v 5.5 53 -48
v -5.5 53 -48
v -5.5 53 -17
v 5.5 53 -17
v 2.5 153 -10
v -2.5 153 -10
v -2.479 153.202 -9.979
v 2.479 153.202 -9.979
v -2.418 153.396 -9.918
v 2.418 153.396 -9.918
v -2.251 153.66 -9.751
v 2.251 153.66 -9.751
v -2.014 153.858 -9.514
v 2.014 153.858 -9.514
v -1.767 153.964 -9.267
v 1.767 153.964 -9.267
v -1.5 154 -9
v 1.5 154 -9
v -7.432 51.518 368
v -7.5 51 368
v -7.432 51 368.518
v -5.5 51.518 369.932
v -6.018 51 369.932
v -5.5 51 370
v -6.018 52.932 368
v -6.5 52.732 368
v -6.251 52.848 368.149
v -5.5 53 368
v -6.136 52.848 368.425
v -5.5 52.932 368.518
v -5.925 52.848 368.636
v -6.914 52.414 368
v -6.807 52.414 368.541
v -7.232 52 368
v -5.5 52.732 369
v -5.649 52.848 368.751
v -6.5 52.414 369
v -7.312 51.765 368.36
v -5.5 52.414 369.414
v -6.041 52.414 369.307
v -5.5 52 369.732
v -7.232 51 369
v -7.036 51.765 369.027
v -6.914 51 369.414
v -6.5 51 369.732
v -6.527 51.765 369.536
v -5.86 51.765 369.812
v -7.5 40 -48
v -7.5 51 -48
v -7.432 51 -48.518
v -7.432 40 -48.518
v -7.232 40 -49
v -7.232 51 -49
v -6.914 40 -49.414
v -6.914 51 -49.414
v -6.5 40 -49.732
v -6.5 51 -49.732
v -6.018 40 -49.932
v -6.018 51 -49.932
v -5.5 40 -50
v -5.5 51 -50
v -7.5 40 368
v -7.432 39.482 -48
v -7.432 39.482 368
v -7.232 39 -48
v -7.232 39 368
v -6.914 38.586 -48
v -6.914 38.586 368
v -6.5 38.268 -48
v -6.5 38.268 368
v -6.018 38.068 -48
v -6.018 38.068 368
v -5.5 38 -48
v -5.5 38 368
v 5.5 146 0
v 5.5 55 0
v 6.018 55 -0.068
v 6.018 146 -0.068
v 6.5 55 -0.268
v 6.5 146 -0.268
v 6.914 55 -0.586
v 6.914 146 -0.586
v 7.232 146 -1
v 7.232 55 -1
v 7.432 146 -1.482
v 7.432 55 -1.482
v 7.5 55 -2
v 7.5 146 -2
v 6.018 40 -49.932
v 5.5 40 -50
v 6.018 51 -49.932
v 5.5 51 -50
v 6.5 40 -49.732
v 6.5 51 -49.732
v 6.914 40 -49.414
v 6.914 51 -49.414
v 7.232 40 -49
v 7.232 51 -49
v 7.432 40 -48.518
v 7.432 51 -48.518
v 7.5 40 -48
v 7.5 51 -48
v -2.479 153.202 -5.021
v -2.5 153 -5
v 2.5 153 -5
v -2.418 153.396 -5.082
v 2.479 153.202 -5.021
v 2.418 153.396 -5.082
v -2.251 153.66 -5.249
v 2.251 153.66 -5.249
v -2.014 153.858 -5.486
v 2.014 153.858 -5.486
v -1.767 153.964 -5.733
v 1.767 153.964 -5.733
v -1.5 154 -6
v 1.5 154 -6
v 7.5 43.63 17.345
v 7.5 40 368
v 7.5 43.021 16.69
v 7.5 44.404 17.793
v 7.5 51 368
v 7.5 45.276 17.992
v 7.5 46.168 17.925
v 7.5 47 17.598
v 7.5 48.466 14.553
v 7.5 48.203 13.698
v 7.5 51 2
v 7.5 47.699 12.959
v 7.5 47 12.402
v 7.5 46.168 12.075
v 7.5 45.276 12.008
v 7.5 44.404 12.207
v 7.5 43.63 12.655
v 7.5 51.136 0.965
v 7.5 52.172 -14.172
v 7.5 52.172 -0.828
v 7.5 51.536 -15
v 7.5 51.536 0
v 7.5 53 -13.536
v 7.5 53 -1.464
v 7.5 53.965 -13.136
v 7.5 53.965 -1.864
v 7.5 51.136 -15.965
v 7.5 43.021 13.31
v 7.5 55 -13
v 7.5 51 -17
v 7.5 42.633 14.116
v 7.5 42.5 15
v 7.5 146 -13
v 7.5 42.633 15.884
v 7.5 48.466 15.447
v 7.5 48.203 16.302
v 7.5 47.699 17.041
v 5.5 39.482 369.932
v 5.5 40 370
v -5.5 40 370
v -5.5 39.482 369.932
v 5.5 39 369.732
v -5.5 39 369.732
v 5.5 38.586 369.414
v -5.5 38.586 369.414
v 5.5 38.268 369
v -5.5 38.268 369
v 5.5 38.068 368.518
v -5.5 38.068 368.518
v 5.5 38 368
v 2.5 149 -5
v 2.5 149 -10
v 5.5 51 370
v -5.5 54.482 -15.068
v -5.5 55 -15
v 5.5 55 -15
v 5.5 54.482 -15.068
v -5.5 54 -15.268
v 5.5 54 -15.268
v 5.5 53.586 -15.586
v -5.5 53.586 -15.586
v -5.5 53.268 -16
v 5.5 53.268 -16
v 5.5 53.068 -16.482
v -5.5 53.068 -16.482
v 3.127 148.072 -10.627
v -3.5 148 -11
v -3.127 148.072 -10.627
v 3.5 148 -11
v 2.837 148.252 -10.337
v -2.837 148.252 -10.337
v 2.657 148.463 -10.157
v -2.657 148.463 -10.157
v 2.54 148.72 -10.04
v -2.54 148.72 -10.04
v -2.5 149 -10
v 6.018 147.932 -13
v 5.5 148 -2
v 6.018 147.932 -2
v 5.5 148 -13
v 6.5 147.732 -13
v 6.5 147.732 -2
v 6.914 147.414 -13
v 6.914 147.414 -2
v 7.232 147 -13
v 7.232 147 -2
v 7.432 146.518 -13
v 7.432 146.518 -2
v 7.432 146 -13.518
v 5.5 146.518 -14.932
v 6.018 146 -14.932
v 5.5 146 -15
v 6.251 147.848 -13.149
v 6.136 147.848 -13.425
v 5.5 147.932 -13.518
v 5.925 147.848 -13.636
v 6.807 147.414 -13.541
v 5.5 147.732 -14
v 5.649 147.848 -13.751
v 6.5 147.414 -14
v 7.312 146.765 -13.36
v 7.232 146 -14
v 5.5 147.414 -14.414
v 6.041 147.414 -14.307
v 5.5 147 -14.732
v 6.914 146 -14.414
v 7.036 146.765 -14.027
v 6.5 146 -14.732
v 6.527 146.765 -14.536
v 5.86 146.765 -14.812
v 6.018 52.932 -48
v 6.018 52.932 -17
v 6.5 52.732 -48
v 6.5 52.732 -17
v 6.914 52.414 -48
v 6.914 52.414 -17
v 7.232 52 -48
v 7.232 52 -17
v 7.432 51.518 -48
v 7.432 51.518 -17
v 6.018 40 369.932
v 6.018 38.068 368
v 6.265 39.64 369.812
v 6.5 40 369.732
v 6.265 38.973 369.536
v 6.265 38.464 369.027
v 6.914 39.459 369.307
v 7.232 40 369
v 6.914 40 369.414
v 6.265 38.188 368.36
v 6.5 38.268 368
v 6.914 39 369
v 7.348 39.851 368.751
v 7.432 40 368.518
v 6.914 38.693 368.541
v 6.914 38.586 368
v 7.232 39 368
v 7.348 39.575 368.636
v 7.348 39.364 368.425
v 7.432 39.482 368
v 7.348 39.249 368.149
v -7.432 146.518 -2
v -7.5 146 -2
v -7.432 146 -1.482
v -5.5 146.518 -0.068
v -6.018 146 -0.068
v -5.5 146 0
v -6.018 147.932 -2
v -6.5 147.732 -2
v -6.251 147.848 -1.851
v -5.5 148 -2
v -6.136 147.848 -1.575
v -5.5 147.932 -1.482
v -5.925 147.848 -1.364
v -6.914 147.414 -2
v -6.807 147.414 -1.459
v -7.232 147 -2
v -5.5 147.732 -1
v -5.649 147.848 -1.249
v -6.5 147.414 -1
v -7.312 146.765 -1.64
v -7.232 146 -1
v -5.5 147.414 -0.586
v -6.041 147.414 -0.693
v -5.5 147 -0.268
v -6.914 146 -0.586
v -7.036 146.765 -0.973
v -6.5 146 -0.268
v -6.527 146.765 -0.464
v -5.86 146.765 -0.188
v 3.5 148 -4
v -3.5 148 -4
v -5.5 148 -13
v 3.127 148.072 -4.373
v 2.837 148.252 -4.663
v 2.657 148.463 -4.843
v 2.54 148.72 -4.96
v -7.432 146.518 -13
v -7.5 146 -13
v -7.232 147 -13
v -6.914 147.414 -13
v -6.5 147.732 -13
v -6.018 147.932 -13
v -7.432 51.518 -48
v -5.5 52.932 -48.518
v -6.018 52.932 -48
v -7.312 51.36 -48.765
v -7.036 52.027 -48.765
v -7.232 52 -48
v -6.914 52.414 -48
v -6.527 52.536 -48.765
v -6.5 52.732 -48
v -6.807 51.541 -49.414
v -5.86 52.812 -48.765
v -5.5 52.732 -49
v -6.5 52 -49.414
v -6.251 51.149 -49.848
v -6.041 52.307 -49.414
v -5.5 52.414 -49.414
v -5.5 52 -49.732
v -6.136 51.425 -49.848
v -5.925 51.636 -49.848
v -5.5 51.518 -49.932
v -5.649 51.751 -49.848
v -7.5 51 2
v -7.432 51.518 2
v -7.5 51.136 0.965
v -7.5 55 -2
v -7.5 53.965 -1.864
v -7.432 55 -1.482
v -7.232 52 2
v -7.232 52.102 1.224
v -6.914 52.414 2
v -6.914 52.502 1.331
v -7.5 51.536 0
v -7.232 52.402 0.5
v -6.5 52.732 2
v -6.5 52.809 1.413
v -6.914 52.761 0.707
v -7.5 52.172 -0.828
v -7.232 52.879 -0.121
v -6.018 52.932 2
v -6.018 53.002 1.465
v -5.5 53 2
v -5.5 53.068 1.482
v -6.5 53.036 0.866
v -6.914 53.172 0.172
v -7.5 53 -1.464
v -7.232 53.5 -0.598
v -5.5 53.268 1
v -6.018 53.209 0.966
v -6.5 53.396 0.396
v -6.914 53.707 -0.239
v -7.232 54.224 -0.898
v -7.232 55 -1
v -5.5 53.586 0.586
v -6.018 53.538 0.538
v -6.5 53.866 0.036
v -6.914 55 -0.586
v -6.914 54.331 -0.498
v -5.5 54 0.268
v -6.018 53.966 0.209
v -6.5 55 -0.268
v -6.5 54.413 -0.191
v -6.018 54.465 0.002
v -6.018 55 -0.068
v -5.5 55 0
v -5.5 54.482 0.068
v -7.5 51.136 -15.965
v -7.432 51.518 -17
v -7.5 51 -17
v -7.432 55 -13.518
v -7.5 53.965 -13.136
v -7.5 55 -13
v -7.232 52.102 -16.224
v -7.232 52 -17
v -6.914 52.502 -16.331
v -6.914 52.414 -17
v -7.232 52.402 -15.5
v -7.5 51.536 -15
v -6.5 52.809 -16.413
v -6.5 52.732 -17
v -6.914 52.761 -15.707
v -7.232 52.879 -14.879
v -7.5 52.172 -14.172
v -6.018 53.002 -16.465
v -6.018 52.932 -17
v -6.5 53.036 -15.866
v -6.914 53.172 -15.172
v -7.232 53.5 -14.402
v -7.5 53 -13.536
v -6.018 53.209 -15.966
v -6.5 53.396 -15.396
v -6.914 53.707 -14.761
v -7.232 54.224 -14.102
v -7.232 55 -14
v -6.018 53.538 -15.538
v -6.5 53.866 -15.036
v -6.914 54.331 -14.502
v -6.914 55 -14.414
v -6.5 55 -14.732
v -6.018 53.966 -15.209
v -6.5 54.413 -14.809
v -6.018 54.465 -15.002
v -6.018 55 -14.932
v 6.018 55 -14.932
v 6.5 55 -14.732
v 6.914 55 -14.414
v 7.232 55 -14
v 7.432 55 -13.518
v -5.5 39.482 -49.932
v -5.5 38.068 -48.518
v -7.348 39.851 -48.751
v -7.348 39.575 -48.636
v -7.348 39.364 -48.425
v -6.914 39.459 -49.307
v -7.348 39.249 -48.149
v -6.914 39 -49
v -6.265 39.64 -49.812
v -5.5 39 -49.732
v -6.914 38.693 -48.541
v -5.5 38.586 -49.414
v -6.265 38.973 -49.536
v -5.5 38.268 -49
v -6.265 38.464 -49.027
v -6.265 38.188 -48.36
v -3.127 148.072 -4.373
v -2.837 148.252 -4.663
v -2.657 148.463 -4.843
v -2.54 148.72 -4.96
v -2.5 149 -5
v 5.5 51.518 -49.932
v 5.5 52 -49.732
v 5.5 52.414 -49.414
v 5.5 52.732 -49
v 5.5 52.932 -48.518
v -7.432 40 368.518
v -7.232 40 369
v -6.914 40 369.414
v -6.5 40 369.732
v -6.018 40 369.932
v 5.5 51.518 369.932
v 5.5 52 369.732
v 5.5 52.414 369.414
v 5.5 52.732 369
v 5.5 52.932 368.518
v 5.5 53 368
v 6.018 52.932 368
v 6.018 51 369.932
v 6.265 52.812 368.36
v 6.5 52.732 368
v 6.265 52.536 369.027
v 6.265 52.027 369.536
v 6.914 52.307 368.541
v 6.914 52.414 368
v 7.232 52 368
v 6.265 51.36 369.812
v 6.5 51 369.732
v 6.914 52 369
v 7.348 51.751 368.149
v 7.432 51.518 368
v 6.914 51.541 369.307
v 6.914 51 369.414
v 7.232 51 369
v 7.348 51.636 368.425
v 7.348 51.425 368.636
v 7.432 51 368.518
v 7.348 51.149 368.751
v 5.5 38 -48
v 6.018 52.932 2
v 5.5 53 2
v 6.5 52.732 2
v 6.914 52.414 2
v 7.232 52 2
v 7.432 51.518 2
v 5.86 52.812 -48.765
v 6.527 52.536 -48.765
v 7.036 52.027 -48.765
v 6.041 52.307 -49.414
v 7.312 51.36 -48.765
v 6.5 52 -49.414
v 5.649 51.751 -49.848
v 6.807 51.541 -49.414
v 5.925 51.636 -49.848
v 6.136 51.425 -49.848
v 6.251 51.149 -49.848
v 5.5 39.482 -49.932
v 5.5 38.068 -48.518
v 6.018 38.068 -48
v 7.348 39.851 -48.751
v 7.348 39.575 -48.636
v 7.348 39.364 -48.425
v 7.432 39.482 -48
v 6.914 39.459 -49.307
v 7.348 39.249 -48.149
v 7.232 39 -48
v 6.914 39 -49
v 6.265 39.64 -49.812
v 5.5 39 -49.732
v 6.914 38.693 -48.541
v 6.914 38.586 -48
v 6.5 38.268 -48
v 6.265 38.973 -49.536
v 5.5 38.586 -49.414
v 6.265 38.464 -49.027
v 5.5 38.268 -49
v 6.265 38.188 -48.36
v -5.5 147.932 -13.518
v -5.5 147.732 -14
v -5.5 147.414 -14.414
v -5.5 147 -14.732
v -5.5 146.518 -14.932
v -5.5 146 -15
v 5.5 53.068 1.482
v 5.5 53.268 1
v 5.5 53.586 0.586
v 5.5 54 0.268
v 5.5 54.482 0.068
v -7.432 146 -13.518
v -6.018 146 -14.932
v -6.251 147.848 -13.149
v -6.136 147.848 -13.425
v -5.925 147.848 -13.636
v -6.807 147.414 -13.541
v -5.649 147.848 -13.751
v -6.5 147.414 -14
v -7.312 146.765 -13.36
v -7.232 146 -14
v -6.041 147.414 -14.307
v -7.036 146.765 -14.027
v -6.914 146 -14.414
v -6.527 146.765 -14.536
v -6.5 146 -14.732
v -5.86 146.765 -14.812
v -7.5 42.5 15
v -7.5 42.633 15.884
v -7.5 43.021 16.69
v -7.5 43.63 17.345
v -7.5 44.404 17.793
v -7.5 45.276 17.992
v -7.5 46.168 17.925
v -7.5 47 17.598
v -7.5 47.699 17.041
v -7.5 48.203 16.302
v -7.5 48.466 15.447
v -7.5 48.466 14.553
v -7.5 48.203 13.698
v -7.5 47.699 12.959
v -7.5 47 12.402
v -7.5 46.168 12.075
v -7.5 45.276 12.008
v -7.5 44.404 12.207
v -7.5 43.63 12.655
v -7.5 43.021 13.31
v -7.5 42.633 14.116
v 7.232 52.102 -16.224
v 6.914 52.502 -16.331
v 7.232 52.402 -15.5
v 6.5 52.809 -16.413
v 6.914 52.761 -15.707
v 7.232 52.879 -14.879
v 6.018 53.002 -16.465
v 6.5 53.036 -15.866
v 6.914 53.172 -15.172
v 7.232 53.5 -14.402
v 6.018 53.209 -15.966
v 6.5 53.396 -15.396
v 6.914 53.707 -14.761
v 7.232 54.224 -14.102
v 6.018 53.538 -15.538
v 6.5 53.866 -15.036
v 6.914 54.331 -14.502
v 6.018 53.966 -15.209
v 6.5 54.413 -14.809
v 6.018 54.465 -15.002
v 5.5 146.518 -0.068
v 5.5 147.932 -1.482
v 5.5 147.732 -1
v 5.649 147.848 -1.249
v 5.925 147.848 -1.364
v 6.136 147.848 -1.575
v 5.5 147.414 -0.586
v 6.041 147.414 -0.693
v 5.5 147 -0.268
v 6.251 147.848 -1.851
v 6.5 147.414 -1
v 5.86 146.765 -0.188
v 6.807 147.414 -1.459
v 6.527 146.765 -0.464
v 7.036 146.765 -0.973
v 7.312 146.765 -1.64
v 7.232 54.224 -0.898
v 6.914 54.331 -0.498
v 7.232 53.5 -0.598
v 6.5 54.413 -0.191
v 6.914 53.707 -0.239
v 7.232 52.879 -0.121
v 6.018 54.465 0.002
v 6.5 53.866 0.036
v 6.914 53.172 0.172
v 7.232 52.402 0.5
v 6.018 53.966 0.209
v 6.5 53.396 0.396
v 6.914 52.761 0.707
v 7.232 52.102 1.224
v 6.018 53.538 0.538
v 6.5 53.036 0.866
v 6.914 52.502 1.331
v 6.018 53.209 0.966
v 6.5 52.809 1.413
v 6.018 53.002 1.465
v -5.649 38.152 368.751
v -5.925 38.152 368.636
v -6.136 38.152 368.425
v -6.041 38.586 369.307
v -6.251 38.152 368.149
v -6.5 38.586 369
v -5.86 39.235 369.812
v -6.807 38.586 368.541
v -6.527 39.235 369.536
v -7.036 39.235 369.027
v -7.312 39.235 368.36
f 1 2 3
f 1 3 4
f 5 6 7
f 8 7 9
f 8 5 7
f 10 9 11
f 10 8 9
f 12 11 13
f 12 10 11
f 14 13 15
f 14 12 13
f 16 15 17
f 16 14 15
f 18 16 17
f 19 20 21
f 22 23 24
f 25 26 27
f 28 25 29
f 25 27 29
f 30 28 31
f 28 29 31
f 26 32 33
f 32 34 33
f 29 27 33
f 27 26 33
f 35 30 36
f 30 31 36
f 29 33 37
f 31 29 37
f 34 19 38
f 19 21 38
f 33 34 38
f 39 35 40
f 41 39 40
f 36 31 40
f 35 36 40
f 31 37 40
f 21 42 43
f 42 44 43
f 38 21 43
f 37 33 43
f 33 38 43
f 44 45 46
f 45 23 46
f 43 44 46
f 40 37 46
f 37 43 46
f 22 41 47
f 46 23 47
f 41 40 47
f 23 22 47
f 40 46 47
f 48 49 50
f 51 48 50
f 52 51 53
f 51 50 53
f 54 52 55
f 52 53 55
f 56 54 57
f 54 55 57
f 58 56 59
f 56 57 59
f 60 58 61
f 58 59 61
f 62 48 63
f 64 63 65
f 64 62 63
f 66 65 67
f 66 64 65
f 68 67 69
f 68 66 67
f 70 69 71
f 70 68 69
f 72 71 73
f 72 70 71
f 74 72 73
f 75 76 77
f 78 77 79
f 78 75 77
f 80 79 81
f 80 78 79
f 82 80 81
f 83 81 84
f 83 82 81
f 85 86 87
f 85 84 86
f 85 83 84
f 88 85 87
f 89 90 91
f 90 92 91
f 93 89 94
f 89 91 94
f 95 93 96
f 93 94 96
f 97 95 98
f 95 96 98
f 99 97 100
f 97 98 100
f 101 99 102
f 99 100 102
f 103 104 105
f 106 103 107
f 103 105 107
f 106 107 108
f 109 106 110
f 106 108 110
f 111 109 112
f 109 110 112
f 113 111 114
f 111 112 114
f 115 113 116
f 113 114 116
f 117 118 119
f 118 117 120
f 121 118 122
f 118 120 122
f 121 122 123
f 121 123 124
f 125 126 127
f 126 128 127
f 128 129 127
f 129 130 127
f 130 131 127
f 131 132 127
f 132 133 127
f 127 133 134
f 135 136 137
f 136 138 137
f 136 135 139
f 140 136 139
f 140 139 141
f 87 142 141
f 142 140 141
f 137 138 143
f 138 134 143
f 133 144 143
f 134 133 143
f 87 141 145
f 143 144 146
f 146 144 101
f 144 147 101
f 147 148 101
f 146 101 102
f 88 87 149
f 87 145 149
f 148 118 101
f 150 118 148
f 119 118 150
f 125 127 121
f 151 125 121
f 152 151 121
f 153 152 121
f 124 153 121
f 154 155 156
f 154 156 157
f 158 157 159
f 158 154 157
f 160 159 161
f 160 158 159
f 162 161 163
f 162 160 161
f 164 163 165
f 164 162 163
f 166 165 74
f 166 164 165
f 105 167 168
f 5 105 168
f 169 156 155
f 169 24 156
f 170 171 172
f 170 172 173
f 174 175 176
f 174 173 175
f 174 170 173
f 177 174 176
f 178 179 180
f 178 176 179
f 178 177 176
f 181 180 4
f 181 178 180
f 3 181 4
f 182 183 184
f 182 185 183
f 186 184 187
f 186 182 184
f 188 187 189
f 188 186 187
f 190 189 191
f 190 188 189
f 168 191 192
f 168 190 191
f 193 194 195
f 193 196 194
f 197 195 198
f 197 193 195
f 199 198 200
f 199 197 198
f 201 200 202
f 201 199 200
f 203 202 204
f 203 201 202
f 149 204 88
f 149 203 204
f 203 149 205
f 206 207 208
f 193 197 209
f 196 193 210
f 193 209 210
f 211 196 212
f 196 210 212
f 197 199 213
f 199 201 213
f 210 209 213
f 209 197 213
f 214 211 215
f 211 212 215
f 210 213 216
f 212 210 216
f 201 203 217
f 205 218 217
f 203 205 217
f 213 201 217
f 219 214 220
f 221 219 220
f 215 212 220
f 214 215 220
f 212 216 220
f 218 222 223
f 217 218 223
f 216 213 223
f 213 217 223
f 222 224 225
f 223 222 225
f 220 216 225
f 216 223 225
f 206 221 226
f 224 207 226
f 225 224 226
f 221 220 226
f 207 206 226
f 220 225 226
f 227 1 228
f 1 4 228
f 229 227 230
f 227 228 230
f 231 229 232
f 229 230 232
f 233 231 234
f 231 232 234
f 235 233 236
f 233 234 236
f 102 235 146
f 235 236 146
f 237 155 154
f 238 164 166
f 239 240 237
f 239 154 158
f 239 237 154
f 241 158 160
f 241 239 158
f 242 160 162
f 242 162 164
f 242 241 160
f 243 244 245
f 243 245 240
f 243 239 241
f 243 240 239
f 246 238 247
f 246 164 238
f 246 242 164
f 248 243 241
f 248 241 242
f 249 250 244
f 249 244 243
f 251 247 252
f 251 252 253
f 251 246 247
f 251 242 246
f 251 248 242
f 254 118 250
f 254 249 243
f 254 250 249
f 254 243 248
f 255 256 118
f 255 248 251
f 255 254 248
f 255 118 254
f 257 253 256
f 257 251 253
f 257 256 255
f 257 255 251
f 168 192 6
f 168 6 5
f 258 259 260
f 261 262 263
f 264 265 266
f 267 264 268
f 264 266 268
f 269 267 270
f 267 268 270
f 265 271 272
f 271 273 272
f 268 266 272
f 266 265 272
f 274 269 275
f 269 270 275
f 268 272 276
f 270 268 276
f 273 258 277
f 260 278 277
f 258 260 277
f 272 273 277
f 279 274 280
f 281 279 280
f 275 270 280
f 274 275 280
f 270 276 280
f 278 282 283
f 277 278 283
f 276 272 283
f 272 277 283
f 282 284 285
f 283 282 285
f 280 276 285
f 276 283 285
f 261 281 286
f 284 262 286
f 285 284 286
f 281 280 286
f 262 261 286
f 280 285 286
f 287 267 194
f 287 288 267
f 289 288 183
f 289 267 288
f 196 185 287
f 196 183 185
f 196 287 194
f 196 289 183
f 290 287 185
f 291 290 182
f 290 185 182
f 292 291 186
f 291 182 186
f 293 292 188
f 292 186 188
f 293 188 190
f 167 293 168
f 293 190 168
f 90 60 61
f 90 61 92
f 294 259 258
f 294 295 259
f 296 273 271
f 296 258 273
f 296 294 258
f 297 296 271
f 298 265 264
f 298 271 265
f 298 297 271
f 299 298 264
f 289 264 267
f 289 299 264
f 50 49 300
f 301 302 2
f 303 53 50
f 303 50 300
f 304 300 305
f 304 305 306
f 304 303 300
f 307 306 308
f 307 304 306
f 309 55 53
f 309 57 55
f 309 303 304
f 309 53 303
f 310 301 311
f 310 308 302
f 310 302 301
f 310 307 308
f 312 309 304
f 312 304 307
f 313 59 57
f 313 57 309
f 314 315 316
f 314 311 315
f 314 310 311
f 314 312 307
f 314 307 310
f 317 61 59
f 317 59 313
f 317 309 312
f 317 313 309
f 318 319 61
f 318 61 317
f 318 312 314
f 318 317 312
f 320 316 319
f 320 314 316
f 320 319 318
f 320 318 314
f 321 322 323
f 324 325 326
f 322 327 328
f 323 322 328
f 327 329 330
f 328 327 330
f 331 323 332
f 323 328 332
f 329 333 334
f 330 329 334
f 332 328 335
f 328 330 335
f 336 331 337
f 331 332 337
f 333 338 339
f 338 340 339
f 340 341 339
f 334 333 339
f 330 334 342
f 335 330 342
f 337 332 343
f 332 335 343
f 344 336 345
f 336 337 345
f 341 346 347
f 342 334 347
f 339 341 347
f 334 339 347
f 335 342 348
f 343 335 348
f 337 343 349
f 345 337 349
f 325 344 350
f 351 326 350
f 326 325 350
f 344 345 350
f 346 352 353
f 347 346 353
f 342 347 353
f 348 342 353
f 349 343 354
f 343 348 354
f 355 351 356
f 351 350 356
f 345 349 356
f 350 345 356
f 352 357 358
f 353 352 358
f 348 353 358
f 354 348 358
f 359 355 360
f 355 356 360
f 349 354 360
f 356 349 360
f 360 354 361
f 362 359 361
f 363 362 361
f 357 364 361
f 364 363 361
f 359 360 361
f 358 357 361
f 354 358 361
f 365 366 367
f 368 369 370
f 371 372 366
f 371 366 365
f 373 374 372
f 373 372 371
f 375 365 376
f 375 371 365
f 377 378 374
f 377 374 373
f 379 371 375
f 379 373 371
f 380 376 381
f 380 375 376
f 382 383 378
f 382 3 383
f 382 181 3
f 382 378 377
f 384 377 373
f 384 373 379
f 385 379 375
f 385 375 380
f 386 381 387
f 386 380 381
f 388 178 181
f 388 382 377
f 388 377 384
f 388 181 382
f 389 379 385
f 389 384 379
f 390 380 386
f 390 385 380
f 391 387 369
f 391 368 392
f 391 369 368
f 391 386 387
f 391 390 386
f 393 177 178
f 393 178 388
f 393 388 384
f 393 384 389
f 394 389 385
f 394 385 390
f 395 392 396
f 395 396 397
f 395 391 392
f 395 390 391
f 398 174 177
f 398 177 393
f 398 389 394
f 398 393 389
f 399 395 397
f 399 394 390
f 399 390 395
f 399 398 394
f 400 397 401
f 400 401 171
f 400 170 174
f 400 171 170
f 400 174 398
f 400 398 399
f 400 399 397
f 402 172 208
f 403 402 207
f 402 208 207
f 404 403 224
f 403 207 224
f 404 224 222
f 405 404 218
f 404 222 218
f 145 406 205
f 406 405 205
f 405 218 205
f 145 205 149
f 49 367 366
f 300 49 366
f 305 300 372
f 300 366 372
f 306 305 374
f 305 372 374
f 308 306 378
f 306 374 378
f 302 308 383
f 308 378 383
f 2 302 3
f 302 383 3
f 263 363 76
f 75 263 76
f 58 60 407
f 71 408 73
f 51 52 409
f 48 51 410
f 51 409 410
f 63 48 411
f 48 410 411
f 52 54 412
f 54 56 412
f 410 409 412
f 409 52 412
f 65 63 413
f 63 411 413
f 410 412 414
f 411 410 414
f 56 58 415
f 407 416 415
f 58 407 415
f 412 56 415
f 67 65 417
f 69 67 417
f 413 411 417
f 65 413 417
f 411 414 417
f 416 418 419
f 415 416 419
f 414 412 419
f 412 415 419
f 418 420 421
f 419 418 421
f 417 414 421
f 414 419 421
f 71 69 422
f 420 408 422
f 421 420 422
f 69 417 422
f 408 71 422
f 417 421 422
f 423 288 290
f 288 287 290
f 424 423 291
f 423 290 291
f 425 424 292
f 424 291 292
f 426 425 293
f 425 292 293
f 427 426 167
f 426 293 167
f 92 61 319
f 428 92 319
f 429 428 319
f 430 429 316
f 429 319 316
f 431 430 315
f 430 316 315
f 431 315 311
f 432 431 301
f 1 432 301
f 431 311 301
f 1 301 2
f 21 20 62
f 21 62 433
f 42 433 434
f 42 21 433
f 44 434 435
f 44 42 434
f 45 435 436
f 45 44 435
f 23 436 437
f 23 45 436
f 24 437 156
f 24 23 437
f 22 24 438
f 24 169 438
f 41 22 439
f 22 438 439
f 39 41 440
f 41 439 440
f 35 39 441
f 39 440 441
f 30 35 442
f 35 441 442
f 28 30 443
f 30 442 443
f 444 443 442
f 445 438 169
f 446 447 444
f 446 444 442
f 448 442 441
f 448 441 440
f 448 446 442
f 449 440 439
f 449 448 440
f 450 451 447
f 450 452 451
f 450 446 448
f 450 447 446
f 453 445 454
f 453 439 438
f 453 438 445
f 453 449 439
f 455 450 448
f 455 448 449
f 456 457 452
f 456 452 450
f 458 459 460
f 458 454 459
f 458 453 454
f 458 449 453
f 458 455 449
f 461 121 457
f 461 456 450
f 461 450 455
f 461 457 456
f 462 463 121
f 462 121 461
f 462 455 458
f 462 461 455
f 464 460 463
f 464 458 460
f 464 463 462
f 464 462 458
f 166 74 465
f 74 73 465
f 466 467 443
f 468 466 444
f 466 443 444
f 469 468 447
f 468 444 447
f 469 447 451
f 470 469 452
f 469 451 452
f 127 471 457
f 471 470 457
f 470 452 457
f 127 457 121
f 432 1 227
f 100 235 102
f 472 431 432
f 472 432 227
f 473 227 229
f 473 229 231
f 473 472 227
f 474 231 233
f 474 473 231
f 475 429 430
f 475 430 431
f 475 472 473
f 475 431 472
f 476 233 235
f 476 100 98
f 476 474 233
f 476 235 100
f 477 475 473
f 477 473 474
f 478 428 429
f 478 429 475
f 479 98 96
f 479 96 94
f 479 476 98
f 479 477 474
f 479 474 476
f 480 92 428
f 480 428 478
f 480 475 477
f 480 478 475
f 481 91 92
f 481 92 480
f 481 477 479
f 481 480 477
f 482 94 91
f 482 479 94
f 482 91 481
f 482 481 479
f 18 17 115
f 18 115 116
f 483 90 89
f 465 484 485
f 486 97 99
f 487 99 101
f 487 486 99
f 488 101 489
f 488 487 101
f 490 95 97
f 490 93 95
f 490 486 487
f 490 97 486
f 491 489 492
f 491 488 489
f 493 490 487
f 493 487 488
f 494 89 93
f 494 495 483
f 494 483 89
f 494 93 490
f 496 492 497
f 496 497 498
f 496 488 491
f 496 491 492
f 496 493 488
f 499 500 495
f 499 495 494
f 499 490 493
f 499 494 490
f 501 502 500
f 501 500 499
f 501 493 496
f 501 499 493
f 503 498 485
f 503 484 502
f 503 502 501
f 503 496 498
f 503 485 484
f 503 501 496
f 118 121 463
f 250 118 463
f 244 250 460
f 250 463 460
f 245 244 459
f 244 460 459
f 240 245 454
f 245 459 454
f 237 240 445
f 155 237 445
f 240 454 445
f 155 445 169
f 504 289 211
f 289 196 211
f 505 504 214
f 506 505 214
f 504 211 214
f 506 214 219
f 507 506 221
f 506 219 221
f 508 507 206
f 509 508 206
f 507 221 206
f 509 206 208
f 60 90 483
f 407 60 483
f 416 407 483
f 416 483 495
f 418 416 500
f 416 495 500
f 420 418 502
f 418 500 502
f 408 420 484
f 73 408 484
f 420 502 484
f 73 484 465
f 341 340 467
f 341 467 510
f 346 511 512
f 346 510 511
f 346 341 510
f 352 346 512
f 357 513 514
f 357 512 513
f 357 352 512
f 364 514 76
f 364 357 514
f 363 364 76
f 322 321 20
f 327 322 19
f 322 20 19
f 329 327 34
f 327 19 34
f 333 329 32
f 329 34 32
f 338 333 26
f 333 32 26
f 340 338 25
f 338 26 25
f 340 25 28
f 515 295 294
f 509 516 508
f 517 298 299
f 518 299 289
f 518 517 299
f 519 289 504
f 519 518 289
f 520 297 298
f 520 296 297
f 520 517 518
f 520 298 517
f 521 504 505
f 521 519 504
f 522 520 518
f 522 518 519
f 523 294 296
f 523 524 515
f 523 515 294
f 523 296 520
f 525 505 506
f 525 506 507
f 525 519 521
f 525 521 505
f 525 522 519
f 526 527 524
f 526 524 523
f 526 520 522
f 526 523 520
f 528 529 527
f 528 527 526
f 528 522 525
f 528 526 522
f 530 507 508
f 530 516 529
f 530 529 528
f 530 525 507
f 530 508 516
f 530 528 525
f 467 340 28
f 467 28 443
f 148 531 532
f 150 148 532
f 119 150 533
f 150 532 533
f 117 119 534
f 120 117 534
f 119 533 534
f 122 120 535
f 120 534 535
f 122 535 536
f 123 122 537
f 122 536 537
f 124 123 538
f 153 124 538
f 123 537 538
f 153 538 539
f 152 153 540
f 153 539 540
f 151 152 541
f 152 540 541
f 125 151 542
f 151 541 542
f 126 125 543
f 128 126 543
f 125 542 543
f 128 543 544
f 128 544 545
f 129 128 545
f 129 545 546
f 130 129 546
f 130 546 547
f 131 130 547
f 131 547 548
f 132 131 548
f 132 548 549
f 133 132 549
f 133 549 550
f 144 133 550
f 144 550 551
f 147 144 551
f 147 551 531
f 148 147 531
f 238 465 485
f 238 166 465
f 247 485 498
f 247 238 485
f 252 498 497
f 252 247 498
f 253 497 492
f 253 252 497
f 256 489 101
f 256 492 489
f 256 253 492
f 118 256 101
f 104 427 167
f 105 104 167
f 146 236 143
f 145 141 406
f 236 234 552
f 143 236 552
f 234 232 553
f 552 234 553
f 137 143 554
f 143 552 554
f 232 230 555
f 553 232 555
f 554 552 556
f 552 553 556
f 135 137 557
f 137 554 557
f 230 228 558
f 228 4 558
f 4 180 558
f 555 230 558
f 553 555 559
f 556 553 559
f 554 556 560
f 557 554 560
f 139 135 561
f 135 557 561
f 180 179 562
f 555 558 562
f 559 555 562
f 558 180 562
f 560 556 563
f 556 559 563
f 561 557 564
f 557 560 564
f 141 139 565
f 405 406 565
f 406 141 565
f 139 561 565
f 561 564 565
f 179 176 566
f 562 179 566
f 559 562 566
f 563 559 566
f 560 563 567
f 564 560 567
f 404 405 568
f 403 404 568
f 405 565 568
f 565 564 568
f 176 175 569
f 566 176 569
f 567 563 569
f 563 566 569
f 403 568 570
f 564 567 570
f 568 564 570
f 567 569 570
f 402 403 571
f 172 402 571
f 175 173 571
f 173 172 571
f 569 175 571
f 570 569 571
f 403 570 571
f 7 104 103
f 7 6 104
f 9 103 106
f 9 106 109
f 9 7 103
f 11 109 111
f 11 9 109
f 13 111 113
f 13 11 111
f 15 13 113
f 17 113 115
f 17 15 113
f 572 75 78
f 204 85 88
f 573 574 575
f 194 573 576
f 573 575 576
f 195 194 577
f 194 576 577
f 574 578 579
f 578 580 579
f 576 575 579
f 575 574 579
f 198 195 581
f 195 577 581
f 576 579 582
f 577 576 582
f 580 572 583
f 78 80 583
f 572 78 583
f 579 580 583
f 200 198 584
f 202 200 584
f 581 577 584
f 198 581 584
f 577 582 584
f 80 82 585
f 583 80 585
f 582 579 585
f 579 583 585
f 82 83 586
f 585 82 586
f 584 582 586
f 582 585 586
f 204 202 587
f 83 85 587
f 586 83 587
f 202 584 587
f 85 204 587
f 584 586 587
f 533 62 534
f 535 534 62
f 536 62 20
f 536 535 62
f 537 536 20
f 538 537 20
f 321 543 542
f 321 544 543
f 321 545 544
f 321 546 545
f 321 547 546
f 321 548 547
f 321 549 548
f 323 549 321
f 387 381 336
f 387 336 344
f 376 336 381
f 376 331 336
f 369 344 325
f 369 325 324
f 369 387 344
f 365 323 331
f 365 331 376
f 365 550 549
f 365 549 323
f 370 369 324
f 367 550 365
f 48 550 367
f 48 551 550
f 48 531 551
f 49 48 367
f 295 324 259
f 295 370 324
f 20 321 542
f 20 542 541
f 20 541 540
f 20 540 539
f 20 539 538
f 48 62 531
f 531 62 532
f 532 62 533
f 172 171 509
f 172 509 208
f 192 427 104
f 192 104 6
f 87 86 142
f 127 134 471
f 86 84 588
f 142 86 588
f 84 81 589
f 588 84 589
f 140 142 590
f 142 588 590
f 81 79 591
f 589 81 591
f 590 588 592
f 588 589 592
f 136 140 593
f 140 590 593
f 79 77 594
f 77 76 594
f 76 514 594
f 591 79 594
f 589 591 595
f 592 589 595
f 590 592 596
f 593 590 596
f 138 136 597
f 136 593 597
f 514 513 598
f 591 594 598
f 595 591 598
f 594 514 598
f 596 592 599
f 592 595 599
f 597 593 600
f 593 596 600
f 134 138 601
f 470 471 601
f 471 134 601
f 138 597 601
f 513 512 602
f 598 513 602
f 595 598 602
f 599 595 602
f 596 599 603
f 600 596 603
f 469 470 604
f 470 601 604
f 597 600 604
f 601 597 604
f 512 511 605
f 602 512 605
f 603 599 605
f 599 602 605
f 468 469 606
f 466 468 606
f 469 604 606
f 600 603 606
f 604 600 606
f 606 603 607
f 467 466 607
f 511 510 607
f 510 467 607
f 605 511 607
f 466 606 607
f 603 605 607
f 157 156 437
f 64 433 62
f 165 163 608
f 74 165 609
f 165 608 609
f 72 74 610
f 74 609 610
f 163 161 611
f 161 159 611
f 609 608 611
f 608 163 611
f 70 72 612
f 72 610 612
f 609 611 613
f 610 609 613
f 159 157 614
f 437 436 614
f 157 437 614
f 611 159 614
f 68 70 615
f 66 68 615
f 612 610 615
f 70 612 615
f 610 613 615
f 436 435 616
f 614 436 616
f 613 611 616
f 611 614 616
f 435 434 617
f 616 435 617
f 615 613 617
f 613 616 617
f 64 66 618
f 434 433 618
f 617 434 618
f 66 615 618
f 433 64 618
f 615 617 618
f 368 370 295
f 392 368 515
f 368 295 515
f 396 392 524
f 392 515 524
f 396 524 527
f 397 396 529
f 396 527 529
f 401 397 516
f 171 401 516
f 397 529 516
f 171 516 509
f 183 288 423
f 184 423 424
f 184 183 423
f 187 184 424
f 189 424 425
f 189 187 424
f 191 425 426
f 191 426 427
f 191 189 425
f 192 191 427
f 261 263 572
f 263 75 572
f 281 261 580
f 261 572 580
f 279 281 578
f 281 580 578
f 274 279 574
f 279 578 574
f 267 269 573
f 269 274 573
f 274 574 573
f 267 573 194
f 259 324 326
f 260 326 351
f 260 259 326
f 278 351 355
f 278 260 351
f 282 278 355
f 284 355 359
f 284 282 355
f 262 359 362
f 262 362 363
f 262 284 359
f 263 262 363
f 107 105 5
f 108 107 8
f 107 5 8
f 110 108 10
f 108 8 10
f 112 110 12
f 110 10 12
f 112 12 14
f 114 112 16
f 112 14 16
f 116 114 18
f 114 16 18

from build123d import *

# Parameters (mm, degrees)
SKETCH13_W          = 15
SKETCH13_H          = 15
BOSS_EXTRUDE3_DEPTH = 420
BOSS_EXTRUDE4_START = -70
SKETCH12_W          = 15
SKETCH12_H          = 15
BOSS_EXTRUDE4_DEPTH = 110
SKETCH14_W          = 5
SKETCH14_H          = 5
BOSS_EXTRUDE5_DEPTH = 6
FILLET1_R           = 2
FILLET2_R           = 1
FILLET3_R           = 2
FILLET4_R           = 2
SKETCH15_R          = 3
CUT_EXTRUDE1_DEPTH  = 402.04987221


with BuildPart() as part:
    # Sketch13 → Boss-Extrude3 (new body)
    with BuildSketch(Plane.XY.offset(-50)):
        with Locations((0, 45.5)):
            Rectangle(SKETCH13_W, SKETCH13_H)
    extrude(amount=BOSS_EXTRUDE3_DEPTH)

    # Sketch12 → Boss-Extrude4 (add)
    with BuildSketch(Plane(origin=(0, 108, 0), x_dir=(1, 0, 0), z_dir=(0, 1, 0)).offset(BOSS_EXTRUDE4_START)):
        with Locations((0, 7.5)):
            Rectangle(SKETCH12_W, SKETCH12_H)
    extrude(amount=BOSS_EXTRUDE4_DEPTH)

    # Sketch14 → Boss-Extrude5 (add)
    with BuildSketch(Plane(origin=(0, 148, 0), x_dir=(1, 0, 0), z_dir=(0, 1, 0))):
        with Locations((0, 7.5)):
            Rectangle(SKETCH14_W, SKETCH14_H)
    extrude(amount=BOSS_EXTRUDE5_DEPTH)

    # Fillet1
    fillet1_edges = [part.edges().sort_by_distance(p)[0] for p in [
        (-7.5, 45.5, 370),
        (0, 38, 370),
        (-7.5, 53, -32.5),
        (7.5, 53, -32.5),
        (-7.5, 100.5, -15),
        (-7.5, 100.5, 0),
        (0, 53, 0),
        (7.5, 100.5, 0),
        (7.5, 100.5, -15),
        (0, 53, -15),
        (-7.5, 148, -7.5),
        (0, 148, 0),
        (7.5, 148, -7.5),
        (0, 148, -15),
        (0, 38, -50),
        (-7.5, 45.5, -50),
        (7.5, 45.5, -50),
        (7.5, 38, 160),
        (-7.5, 38, 160),
        (-7.5, 53, 185),
        (7.5, 53, 185),
        (0, 53, 370),
    ]]
    fillet(fillet1_edges, radius=FILLET1_R)

    # Fillet2
    fillet2_edges = [part.edges().sort_by_distance(p)[0] for p in [
        (2.5, 148, -7.5),
        (0, 148, -10),
        (-2.5, 148, -7.5),
        (0, 148, -5),
        (2.5, 154, -7.5),
        (0, 154, -10),
        (-2.5, 154, -7.5),
        (0, 154, -5),
    ]]
    fillet(fillet2_edges, radius=FILLET2_R)

    # Fillet3
    # the kernel refuses this fillet: 2 mm, written as the material it takes off along each edge
    with BuildSketch(Plane(origin=(5.5, 51, 368), x_dir=(0, 0, 1), z_dir=(1, 0, 0))) as fillet3_piece_1_section:
        Polygon((0, 0), (FILLET3_R, 0), (FILLET3_R, -FILLET3_R), (0, -FILLET3_R), align=None)
    fillet3_piece_1 = extrude(amount=FILLET3_R, mode=Mode.PRIVATE)
    fillet3_piece_1 = fillet3_piece_1 - Plane(origin=(5.5, 51, 368), x_dir=(0, -0.7071067811865475, -0.7071067811865475), z_dir=(1, 0, 0)) * Sphere(FILLET3_R, mode=Mode.PRIVATE)
    add(fillet3_piece_1, mode=Mode.SUBTRACT)
    with BuildSketch(Plane(origin=(5.5, 40, 368), x_dir=(0, 0, 1), z_dir=(1, 0, 0))) as fillet3_piece_2_section:
        Polygon((0, 0), (FILLET3_R, 0), (FILLET3_R, FILLET3_R), (0, FILLET3_R), align=None)
    fillet3_piece_2 = extrude(amount=FILLET3_R, mode=Mode.PRIVATE)
    fillet3_piece_2 = fillet3_piece_2 - Plane(origin=(5.5, 40, 368), x_dir=(0, 0.7071067811865475, -0.7071067811865475), z_dir=(1, 0, 0)) * Sphere(FILLET3_R, mode=Mode.PRIVATE)
    add(fillet3_piece_2, mode=Mode.SUBTRACT)
    with BuildSketch(Plane(origin=(7.5, 51, 370), x_dir=(0, 0, -1), z_dir=(0, -1, 0))) as fillet3_piece_3:
        with BuildLine():
            CenterArc((FILLET3_R, -FILLET3_R), FILLET3_R, 90, 90)
            Line((0, -FILLET3_R), (0, 0))
            Line((0, 0), (FILLET3_R, 0))
        make_face()
    extrude(amount=11, mode=Mode.SUBTRACT)

    # Fillet4
    # the kernel refuses this fillet: 2 mm, written as the material it takes off along each edge
    with BuildSketch(Plane(origin=(-5.5, 51, -48), x_dir=(0, 1, 0), z_dir=(0, 0, -1))) as fillet4_piece_1_section:
        Polygon((0, 0), (FILLET4_R, 0), (FILLET4_R, -FILLET4_R), (0, -FILLET4_R), align=None)
    fillet4_piece_1 = extrude(amount=FILLET4_R, mode=Mode.PRIVATE)
    fillet4_piece_1 = fillet4_piece_1 - Plane(origin=(-5.5, 51, -48), x_dir=(0.7071067811865472, -0.7071067811865478, 0), z_dir=(0, 0, -1)) * Sphere(FILLET4_R, mode=Mode.PRIVATE)
    add(fillet4_piece_1, mode=Mode.SUBTRACT)
    with BuildSketch(Plane(origin=(5.5, 51, -48), x_dir=(0, 1, 0), z_dir=(0, 0, -1))) as fillet4_piece_2_section:
        Polygon((0, 0), (FILLET4_R, 0), (FILLET4_R, FILLET4_R), (0, FILLET4_R), align=None)
    fillet4_piece_2 = extrude(amount=FILLET4_R, mode=Mode.PRIVATE)
    fillet4_piece_2 = fillet4_piece_2 - Plane(origin=(5.5, 51, -48), x_dir=(-0.7071067811865479, -0.7071067811865472, 0), z_dir=(0, 0, -1)) * Sphere(FILLET4_R, mode=Mode.PRIVATE)
    add(fillet4_piece_2, mode=Mode.SUBTRACT)
    with BuildSketch(Plane(origin=(-5.5, 53, -50), x_dir=(0, -1, 0), z_dir=(1, 0, 0))) as fillet4_piece_3:
        with BuildLine():
            CenterArc((FILLET4_R, -FILLET4_R), FILLET4_R, 90, 90)
            Line((0, -FILLET4_R), (0, 0))
            Line((0, 0), (FILLET4_R, 0))
        make_face()
    extrude(amount=11, mode=Mode.SUBTRACT)

    # Sketch15 → Cut-Extrude1 (cut, through all)
    with BuildSketch(Plane.ZY.offset(7.5)):
        with Locations(Location((15, 45.5, 0), (0, 0, 270))):
            Circle(SKETCH15_R)
    extrude(amount=-CUT_EXTRUDE1_DEPTH, mode=Mode.SUBTRACT)


solid = part.part
